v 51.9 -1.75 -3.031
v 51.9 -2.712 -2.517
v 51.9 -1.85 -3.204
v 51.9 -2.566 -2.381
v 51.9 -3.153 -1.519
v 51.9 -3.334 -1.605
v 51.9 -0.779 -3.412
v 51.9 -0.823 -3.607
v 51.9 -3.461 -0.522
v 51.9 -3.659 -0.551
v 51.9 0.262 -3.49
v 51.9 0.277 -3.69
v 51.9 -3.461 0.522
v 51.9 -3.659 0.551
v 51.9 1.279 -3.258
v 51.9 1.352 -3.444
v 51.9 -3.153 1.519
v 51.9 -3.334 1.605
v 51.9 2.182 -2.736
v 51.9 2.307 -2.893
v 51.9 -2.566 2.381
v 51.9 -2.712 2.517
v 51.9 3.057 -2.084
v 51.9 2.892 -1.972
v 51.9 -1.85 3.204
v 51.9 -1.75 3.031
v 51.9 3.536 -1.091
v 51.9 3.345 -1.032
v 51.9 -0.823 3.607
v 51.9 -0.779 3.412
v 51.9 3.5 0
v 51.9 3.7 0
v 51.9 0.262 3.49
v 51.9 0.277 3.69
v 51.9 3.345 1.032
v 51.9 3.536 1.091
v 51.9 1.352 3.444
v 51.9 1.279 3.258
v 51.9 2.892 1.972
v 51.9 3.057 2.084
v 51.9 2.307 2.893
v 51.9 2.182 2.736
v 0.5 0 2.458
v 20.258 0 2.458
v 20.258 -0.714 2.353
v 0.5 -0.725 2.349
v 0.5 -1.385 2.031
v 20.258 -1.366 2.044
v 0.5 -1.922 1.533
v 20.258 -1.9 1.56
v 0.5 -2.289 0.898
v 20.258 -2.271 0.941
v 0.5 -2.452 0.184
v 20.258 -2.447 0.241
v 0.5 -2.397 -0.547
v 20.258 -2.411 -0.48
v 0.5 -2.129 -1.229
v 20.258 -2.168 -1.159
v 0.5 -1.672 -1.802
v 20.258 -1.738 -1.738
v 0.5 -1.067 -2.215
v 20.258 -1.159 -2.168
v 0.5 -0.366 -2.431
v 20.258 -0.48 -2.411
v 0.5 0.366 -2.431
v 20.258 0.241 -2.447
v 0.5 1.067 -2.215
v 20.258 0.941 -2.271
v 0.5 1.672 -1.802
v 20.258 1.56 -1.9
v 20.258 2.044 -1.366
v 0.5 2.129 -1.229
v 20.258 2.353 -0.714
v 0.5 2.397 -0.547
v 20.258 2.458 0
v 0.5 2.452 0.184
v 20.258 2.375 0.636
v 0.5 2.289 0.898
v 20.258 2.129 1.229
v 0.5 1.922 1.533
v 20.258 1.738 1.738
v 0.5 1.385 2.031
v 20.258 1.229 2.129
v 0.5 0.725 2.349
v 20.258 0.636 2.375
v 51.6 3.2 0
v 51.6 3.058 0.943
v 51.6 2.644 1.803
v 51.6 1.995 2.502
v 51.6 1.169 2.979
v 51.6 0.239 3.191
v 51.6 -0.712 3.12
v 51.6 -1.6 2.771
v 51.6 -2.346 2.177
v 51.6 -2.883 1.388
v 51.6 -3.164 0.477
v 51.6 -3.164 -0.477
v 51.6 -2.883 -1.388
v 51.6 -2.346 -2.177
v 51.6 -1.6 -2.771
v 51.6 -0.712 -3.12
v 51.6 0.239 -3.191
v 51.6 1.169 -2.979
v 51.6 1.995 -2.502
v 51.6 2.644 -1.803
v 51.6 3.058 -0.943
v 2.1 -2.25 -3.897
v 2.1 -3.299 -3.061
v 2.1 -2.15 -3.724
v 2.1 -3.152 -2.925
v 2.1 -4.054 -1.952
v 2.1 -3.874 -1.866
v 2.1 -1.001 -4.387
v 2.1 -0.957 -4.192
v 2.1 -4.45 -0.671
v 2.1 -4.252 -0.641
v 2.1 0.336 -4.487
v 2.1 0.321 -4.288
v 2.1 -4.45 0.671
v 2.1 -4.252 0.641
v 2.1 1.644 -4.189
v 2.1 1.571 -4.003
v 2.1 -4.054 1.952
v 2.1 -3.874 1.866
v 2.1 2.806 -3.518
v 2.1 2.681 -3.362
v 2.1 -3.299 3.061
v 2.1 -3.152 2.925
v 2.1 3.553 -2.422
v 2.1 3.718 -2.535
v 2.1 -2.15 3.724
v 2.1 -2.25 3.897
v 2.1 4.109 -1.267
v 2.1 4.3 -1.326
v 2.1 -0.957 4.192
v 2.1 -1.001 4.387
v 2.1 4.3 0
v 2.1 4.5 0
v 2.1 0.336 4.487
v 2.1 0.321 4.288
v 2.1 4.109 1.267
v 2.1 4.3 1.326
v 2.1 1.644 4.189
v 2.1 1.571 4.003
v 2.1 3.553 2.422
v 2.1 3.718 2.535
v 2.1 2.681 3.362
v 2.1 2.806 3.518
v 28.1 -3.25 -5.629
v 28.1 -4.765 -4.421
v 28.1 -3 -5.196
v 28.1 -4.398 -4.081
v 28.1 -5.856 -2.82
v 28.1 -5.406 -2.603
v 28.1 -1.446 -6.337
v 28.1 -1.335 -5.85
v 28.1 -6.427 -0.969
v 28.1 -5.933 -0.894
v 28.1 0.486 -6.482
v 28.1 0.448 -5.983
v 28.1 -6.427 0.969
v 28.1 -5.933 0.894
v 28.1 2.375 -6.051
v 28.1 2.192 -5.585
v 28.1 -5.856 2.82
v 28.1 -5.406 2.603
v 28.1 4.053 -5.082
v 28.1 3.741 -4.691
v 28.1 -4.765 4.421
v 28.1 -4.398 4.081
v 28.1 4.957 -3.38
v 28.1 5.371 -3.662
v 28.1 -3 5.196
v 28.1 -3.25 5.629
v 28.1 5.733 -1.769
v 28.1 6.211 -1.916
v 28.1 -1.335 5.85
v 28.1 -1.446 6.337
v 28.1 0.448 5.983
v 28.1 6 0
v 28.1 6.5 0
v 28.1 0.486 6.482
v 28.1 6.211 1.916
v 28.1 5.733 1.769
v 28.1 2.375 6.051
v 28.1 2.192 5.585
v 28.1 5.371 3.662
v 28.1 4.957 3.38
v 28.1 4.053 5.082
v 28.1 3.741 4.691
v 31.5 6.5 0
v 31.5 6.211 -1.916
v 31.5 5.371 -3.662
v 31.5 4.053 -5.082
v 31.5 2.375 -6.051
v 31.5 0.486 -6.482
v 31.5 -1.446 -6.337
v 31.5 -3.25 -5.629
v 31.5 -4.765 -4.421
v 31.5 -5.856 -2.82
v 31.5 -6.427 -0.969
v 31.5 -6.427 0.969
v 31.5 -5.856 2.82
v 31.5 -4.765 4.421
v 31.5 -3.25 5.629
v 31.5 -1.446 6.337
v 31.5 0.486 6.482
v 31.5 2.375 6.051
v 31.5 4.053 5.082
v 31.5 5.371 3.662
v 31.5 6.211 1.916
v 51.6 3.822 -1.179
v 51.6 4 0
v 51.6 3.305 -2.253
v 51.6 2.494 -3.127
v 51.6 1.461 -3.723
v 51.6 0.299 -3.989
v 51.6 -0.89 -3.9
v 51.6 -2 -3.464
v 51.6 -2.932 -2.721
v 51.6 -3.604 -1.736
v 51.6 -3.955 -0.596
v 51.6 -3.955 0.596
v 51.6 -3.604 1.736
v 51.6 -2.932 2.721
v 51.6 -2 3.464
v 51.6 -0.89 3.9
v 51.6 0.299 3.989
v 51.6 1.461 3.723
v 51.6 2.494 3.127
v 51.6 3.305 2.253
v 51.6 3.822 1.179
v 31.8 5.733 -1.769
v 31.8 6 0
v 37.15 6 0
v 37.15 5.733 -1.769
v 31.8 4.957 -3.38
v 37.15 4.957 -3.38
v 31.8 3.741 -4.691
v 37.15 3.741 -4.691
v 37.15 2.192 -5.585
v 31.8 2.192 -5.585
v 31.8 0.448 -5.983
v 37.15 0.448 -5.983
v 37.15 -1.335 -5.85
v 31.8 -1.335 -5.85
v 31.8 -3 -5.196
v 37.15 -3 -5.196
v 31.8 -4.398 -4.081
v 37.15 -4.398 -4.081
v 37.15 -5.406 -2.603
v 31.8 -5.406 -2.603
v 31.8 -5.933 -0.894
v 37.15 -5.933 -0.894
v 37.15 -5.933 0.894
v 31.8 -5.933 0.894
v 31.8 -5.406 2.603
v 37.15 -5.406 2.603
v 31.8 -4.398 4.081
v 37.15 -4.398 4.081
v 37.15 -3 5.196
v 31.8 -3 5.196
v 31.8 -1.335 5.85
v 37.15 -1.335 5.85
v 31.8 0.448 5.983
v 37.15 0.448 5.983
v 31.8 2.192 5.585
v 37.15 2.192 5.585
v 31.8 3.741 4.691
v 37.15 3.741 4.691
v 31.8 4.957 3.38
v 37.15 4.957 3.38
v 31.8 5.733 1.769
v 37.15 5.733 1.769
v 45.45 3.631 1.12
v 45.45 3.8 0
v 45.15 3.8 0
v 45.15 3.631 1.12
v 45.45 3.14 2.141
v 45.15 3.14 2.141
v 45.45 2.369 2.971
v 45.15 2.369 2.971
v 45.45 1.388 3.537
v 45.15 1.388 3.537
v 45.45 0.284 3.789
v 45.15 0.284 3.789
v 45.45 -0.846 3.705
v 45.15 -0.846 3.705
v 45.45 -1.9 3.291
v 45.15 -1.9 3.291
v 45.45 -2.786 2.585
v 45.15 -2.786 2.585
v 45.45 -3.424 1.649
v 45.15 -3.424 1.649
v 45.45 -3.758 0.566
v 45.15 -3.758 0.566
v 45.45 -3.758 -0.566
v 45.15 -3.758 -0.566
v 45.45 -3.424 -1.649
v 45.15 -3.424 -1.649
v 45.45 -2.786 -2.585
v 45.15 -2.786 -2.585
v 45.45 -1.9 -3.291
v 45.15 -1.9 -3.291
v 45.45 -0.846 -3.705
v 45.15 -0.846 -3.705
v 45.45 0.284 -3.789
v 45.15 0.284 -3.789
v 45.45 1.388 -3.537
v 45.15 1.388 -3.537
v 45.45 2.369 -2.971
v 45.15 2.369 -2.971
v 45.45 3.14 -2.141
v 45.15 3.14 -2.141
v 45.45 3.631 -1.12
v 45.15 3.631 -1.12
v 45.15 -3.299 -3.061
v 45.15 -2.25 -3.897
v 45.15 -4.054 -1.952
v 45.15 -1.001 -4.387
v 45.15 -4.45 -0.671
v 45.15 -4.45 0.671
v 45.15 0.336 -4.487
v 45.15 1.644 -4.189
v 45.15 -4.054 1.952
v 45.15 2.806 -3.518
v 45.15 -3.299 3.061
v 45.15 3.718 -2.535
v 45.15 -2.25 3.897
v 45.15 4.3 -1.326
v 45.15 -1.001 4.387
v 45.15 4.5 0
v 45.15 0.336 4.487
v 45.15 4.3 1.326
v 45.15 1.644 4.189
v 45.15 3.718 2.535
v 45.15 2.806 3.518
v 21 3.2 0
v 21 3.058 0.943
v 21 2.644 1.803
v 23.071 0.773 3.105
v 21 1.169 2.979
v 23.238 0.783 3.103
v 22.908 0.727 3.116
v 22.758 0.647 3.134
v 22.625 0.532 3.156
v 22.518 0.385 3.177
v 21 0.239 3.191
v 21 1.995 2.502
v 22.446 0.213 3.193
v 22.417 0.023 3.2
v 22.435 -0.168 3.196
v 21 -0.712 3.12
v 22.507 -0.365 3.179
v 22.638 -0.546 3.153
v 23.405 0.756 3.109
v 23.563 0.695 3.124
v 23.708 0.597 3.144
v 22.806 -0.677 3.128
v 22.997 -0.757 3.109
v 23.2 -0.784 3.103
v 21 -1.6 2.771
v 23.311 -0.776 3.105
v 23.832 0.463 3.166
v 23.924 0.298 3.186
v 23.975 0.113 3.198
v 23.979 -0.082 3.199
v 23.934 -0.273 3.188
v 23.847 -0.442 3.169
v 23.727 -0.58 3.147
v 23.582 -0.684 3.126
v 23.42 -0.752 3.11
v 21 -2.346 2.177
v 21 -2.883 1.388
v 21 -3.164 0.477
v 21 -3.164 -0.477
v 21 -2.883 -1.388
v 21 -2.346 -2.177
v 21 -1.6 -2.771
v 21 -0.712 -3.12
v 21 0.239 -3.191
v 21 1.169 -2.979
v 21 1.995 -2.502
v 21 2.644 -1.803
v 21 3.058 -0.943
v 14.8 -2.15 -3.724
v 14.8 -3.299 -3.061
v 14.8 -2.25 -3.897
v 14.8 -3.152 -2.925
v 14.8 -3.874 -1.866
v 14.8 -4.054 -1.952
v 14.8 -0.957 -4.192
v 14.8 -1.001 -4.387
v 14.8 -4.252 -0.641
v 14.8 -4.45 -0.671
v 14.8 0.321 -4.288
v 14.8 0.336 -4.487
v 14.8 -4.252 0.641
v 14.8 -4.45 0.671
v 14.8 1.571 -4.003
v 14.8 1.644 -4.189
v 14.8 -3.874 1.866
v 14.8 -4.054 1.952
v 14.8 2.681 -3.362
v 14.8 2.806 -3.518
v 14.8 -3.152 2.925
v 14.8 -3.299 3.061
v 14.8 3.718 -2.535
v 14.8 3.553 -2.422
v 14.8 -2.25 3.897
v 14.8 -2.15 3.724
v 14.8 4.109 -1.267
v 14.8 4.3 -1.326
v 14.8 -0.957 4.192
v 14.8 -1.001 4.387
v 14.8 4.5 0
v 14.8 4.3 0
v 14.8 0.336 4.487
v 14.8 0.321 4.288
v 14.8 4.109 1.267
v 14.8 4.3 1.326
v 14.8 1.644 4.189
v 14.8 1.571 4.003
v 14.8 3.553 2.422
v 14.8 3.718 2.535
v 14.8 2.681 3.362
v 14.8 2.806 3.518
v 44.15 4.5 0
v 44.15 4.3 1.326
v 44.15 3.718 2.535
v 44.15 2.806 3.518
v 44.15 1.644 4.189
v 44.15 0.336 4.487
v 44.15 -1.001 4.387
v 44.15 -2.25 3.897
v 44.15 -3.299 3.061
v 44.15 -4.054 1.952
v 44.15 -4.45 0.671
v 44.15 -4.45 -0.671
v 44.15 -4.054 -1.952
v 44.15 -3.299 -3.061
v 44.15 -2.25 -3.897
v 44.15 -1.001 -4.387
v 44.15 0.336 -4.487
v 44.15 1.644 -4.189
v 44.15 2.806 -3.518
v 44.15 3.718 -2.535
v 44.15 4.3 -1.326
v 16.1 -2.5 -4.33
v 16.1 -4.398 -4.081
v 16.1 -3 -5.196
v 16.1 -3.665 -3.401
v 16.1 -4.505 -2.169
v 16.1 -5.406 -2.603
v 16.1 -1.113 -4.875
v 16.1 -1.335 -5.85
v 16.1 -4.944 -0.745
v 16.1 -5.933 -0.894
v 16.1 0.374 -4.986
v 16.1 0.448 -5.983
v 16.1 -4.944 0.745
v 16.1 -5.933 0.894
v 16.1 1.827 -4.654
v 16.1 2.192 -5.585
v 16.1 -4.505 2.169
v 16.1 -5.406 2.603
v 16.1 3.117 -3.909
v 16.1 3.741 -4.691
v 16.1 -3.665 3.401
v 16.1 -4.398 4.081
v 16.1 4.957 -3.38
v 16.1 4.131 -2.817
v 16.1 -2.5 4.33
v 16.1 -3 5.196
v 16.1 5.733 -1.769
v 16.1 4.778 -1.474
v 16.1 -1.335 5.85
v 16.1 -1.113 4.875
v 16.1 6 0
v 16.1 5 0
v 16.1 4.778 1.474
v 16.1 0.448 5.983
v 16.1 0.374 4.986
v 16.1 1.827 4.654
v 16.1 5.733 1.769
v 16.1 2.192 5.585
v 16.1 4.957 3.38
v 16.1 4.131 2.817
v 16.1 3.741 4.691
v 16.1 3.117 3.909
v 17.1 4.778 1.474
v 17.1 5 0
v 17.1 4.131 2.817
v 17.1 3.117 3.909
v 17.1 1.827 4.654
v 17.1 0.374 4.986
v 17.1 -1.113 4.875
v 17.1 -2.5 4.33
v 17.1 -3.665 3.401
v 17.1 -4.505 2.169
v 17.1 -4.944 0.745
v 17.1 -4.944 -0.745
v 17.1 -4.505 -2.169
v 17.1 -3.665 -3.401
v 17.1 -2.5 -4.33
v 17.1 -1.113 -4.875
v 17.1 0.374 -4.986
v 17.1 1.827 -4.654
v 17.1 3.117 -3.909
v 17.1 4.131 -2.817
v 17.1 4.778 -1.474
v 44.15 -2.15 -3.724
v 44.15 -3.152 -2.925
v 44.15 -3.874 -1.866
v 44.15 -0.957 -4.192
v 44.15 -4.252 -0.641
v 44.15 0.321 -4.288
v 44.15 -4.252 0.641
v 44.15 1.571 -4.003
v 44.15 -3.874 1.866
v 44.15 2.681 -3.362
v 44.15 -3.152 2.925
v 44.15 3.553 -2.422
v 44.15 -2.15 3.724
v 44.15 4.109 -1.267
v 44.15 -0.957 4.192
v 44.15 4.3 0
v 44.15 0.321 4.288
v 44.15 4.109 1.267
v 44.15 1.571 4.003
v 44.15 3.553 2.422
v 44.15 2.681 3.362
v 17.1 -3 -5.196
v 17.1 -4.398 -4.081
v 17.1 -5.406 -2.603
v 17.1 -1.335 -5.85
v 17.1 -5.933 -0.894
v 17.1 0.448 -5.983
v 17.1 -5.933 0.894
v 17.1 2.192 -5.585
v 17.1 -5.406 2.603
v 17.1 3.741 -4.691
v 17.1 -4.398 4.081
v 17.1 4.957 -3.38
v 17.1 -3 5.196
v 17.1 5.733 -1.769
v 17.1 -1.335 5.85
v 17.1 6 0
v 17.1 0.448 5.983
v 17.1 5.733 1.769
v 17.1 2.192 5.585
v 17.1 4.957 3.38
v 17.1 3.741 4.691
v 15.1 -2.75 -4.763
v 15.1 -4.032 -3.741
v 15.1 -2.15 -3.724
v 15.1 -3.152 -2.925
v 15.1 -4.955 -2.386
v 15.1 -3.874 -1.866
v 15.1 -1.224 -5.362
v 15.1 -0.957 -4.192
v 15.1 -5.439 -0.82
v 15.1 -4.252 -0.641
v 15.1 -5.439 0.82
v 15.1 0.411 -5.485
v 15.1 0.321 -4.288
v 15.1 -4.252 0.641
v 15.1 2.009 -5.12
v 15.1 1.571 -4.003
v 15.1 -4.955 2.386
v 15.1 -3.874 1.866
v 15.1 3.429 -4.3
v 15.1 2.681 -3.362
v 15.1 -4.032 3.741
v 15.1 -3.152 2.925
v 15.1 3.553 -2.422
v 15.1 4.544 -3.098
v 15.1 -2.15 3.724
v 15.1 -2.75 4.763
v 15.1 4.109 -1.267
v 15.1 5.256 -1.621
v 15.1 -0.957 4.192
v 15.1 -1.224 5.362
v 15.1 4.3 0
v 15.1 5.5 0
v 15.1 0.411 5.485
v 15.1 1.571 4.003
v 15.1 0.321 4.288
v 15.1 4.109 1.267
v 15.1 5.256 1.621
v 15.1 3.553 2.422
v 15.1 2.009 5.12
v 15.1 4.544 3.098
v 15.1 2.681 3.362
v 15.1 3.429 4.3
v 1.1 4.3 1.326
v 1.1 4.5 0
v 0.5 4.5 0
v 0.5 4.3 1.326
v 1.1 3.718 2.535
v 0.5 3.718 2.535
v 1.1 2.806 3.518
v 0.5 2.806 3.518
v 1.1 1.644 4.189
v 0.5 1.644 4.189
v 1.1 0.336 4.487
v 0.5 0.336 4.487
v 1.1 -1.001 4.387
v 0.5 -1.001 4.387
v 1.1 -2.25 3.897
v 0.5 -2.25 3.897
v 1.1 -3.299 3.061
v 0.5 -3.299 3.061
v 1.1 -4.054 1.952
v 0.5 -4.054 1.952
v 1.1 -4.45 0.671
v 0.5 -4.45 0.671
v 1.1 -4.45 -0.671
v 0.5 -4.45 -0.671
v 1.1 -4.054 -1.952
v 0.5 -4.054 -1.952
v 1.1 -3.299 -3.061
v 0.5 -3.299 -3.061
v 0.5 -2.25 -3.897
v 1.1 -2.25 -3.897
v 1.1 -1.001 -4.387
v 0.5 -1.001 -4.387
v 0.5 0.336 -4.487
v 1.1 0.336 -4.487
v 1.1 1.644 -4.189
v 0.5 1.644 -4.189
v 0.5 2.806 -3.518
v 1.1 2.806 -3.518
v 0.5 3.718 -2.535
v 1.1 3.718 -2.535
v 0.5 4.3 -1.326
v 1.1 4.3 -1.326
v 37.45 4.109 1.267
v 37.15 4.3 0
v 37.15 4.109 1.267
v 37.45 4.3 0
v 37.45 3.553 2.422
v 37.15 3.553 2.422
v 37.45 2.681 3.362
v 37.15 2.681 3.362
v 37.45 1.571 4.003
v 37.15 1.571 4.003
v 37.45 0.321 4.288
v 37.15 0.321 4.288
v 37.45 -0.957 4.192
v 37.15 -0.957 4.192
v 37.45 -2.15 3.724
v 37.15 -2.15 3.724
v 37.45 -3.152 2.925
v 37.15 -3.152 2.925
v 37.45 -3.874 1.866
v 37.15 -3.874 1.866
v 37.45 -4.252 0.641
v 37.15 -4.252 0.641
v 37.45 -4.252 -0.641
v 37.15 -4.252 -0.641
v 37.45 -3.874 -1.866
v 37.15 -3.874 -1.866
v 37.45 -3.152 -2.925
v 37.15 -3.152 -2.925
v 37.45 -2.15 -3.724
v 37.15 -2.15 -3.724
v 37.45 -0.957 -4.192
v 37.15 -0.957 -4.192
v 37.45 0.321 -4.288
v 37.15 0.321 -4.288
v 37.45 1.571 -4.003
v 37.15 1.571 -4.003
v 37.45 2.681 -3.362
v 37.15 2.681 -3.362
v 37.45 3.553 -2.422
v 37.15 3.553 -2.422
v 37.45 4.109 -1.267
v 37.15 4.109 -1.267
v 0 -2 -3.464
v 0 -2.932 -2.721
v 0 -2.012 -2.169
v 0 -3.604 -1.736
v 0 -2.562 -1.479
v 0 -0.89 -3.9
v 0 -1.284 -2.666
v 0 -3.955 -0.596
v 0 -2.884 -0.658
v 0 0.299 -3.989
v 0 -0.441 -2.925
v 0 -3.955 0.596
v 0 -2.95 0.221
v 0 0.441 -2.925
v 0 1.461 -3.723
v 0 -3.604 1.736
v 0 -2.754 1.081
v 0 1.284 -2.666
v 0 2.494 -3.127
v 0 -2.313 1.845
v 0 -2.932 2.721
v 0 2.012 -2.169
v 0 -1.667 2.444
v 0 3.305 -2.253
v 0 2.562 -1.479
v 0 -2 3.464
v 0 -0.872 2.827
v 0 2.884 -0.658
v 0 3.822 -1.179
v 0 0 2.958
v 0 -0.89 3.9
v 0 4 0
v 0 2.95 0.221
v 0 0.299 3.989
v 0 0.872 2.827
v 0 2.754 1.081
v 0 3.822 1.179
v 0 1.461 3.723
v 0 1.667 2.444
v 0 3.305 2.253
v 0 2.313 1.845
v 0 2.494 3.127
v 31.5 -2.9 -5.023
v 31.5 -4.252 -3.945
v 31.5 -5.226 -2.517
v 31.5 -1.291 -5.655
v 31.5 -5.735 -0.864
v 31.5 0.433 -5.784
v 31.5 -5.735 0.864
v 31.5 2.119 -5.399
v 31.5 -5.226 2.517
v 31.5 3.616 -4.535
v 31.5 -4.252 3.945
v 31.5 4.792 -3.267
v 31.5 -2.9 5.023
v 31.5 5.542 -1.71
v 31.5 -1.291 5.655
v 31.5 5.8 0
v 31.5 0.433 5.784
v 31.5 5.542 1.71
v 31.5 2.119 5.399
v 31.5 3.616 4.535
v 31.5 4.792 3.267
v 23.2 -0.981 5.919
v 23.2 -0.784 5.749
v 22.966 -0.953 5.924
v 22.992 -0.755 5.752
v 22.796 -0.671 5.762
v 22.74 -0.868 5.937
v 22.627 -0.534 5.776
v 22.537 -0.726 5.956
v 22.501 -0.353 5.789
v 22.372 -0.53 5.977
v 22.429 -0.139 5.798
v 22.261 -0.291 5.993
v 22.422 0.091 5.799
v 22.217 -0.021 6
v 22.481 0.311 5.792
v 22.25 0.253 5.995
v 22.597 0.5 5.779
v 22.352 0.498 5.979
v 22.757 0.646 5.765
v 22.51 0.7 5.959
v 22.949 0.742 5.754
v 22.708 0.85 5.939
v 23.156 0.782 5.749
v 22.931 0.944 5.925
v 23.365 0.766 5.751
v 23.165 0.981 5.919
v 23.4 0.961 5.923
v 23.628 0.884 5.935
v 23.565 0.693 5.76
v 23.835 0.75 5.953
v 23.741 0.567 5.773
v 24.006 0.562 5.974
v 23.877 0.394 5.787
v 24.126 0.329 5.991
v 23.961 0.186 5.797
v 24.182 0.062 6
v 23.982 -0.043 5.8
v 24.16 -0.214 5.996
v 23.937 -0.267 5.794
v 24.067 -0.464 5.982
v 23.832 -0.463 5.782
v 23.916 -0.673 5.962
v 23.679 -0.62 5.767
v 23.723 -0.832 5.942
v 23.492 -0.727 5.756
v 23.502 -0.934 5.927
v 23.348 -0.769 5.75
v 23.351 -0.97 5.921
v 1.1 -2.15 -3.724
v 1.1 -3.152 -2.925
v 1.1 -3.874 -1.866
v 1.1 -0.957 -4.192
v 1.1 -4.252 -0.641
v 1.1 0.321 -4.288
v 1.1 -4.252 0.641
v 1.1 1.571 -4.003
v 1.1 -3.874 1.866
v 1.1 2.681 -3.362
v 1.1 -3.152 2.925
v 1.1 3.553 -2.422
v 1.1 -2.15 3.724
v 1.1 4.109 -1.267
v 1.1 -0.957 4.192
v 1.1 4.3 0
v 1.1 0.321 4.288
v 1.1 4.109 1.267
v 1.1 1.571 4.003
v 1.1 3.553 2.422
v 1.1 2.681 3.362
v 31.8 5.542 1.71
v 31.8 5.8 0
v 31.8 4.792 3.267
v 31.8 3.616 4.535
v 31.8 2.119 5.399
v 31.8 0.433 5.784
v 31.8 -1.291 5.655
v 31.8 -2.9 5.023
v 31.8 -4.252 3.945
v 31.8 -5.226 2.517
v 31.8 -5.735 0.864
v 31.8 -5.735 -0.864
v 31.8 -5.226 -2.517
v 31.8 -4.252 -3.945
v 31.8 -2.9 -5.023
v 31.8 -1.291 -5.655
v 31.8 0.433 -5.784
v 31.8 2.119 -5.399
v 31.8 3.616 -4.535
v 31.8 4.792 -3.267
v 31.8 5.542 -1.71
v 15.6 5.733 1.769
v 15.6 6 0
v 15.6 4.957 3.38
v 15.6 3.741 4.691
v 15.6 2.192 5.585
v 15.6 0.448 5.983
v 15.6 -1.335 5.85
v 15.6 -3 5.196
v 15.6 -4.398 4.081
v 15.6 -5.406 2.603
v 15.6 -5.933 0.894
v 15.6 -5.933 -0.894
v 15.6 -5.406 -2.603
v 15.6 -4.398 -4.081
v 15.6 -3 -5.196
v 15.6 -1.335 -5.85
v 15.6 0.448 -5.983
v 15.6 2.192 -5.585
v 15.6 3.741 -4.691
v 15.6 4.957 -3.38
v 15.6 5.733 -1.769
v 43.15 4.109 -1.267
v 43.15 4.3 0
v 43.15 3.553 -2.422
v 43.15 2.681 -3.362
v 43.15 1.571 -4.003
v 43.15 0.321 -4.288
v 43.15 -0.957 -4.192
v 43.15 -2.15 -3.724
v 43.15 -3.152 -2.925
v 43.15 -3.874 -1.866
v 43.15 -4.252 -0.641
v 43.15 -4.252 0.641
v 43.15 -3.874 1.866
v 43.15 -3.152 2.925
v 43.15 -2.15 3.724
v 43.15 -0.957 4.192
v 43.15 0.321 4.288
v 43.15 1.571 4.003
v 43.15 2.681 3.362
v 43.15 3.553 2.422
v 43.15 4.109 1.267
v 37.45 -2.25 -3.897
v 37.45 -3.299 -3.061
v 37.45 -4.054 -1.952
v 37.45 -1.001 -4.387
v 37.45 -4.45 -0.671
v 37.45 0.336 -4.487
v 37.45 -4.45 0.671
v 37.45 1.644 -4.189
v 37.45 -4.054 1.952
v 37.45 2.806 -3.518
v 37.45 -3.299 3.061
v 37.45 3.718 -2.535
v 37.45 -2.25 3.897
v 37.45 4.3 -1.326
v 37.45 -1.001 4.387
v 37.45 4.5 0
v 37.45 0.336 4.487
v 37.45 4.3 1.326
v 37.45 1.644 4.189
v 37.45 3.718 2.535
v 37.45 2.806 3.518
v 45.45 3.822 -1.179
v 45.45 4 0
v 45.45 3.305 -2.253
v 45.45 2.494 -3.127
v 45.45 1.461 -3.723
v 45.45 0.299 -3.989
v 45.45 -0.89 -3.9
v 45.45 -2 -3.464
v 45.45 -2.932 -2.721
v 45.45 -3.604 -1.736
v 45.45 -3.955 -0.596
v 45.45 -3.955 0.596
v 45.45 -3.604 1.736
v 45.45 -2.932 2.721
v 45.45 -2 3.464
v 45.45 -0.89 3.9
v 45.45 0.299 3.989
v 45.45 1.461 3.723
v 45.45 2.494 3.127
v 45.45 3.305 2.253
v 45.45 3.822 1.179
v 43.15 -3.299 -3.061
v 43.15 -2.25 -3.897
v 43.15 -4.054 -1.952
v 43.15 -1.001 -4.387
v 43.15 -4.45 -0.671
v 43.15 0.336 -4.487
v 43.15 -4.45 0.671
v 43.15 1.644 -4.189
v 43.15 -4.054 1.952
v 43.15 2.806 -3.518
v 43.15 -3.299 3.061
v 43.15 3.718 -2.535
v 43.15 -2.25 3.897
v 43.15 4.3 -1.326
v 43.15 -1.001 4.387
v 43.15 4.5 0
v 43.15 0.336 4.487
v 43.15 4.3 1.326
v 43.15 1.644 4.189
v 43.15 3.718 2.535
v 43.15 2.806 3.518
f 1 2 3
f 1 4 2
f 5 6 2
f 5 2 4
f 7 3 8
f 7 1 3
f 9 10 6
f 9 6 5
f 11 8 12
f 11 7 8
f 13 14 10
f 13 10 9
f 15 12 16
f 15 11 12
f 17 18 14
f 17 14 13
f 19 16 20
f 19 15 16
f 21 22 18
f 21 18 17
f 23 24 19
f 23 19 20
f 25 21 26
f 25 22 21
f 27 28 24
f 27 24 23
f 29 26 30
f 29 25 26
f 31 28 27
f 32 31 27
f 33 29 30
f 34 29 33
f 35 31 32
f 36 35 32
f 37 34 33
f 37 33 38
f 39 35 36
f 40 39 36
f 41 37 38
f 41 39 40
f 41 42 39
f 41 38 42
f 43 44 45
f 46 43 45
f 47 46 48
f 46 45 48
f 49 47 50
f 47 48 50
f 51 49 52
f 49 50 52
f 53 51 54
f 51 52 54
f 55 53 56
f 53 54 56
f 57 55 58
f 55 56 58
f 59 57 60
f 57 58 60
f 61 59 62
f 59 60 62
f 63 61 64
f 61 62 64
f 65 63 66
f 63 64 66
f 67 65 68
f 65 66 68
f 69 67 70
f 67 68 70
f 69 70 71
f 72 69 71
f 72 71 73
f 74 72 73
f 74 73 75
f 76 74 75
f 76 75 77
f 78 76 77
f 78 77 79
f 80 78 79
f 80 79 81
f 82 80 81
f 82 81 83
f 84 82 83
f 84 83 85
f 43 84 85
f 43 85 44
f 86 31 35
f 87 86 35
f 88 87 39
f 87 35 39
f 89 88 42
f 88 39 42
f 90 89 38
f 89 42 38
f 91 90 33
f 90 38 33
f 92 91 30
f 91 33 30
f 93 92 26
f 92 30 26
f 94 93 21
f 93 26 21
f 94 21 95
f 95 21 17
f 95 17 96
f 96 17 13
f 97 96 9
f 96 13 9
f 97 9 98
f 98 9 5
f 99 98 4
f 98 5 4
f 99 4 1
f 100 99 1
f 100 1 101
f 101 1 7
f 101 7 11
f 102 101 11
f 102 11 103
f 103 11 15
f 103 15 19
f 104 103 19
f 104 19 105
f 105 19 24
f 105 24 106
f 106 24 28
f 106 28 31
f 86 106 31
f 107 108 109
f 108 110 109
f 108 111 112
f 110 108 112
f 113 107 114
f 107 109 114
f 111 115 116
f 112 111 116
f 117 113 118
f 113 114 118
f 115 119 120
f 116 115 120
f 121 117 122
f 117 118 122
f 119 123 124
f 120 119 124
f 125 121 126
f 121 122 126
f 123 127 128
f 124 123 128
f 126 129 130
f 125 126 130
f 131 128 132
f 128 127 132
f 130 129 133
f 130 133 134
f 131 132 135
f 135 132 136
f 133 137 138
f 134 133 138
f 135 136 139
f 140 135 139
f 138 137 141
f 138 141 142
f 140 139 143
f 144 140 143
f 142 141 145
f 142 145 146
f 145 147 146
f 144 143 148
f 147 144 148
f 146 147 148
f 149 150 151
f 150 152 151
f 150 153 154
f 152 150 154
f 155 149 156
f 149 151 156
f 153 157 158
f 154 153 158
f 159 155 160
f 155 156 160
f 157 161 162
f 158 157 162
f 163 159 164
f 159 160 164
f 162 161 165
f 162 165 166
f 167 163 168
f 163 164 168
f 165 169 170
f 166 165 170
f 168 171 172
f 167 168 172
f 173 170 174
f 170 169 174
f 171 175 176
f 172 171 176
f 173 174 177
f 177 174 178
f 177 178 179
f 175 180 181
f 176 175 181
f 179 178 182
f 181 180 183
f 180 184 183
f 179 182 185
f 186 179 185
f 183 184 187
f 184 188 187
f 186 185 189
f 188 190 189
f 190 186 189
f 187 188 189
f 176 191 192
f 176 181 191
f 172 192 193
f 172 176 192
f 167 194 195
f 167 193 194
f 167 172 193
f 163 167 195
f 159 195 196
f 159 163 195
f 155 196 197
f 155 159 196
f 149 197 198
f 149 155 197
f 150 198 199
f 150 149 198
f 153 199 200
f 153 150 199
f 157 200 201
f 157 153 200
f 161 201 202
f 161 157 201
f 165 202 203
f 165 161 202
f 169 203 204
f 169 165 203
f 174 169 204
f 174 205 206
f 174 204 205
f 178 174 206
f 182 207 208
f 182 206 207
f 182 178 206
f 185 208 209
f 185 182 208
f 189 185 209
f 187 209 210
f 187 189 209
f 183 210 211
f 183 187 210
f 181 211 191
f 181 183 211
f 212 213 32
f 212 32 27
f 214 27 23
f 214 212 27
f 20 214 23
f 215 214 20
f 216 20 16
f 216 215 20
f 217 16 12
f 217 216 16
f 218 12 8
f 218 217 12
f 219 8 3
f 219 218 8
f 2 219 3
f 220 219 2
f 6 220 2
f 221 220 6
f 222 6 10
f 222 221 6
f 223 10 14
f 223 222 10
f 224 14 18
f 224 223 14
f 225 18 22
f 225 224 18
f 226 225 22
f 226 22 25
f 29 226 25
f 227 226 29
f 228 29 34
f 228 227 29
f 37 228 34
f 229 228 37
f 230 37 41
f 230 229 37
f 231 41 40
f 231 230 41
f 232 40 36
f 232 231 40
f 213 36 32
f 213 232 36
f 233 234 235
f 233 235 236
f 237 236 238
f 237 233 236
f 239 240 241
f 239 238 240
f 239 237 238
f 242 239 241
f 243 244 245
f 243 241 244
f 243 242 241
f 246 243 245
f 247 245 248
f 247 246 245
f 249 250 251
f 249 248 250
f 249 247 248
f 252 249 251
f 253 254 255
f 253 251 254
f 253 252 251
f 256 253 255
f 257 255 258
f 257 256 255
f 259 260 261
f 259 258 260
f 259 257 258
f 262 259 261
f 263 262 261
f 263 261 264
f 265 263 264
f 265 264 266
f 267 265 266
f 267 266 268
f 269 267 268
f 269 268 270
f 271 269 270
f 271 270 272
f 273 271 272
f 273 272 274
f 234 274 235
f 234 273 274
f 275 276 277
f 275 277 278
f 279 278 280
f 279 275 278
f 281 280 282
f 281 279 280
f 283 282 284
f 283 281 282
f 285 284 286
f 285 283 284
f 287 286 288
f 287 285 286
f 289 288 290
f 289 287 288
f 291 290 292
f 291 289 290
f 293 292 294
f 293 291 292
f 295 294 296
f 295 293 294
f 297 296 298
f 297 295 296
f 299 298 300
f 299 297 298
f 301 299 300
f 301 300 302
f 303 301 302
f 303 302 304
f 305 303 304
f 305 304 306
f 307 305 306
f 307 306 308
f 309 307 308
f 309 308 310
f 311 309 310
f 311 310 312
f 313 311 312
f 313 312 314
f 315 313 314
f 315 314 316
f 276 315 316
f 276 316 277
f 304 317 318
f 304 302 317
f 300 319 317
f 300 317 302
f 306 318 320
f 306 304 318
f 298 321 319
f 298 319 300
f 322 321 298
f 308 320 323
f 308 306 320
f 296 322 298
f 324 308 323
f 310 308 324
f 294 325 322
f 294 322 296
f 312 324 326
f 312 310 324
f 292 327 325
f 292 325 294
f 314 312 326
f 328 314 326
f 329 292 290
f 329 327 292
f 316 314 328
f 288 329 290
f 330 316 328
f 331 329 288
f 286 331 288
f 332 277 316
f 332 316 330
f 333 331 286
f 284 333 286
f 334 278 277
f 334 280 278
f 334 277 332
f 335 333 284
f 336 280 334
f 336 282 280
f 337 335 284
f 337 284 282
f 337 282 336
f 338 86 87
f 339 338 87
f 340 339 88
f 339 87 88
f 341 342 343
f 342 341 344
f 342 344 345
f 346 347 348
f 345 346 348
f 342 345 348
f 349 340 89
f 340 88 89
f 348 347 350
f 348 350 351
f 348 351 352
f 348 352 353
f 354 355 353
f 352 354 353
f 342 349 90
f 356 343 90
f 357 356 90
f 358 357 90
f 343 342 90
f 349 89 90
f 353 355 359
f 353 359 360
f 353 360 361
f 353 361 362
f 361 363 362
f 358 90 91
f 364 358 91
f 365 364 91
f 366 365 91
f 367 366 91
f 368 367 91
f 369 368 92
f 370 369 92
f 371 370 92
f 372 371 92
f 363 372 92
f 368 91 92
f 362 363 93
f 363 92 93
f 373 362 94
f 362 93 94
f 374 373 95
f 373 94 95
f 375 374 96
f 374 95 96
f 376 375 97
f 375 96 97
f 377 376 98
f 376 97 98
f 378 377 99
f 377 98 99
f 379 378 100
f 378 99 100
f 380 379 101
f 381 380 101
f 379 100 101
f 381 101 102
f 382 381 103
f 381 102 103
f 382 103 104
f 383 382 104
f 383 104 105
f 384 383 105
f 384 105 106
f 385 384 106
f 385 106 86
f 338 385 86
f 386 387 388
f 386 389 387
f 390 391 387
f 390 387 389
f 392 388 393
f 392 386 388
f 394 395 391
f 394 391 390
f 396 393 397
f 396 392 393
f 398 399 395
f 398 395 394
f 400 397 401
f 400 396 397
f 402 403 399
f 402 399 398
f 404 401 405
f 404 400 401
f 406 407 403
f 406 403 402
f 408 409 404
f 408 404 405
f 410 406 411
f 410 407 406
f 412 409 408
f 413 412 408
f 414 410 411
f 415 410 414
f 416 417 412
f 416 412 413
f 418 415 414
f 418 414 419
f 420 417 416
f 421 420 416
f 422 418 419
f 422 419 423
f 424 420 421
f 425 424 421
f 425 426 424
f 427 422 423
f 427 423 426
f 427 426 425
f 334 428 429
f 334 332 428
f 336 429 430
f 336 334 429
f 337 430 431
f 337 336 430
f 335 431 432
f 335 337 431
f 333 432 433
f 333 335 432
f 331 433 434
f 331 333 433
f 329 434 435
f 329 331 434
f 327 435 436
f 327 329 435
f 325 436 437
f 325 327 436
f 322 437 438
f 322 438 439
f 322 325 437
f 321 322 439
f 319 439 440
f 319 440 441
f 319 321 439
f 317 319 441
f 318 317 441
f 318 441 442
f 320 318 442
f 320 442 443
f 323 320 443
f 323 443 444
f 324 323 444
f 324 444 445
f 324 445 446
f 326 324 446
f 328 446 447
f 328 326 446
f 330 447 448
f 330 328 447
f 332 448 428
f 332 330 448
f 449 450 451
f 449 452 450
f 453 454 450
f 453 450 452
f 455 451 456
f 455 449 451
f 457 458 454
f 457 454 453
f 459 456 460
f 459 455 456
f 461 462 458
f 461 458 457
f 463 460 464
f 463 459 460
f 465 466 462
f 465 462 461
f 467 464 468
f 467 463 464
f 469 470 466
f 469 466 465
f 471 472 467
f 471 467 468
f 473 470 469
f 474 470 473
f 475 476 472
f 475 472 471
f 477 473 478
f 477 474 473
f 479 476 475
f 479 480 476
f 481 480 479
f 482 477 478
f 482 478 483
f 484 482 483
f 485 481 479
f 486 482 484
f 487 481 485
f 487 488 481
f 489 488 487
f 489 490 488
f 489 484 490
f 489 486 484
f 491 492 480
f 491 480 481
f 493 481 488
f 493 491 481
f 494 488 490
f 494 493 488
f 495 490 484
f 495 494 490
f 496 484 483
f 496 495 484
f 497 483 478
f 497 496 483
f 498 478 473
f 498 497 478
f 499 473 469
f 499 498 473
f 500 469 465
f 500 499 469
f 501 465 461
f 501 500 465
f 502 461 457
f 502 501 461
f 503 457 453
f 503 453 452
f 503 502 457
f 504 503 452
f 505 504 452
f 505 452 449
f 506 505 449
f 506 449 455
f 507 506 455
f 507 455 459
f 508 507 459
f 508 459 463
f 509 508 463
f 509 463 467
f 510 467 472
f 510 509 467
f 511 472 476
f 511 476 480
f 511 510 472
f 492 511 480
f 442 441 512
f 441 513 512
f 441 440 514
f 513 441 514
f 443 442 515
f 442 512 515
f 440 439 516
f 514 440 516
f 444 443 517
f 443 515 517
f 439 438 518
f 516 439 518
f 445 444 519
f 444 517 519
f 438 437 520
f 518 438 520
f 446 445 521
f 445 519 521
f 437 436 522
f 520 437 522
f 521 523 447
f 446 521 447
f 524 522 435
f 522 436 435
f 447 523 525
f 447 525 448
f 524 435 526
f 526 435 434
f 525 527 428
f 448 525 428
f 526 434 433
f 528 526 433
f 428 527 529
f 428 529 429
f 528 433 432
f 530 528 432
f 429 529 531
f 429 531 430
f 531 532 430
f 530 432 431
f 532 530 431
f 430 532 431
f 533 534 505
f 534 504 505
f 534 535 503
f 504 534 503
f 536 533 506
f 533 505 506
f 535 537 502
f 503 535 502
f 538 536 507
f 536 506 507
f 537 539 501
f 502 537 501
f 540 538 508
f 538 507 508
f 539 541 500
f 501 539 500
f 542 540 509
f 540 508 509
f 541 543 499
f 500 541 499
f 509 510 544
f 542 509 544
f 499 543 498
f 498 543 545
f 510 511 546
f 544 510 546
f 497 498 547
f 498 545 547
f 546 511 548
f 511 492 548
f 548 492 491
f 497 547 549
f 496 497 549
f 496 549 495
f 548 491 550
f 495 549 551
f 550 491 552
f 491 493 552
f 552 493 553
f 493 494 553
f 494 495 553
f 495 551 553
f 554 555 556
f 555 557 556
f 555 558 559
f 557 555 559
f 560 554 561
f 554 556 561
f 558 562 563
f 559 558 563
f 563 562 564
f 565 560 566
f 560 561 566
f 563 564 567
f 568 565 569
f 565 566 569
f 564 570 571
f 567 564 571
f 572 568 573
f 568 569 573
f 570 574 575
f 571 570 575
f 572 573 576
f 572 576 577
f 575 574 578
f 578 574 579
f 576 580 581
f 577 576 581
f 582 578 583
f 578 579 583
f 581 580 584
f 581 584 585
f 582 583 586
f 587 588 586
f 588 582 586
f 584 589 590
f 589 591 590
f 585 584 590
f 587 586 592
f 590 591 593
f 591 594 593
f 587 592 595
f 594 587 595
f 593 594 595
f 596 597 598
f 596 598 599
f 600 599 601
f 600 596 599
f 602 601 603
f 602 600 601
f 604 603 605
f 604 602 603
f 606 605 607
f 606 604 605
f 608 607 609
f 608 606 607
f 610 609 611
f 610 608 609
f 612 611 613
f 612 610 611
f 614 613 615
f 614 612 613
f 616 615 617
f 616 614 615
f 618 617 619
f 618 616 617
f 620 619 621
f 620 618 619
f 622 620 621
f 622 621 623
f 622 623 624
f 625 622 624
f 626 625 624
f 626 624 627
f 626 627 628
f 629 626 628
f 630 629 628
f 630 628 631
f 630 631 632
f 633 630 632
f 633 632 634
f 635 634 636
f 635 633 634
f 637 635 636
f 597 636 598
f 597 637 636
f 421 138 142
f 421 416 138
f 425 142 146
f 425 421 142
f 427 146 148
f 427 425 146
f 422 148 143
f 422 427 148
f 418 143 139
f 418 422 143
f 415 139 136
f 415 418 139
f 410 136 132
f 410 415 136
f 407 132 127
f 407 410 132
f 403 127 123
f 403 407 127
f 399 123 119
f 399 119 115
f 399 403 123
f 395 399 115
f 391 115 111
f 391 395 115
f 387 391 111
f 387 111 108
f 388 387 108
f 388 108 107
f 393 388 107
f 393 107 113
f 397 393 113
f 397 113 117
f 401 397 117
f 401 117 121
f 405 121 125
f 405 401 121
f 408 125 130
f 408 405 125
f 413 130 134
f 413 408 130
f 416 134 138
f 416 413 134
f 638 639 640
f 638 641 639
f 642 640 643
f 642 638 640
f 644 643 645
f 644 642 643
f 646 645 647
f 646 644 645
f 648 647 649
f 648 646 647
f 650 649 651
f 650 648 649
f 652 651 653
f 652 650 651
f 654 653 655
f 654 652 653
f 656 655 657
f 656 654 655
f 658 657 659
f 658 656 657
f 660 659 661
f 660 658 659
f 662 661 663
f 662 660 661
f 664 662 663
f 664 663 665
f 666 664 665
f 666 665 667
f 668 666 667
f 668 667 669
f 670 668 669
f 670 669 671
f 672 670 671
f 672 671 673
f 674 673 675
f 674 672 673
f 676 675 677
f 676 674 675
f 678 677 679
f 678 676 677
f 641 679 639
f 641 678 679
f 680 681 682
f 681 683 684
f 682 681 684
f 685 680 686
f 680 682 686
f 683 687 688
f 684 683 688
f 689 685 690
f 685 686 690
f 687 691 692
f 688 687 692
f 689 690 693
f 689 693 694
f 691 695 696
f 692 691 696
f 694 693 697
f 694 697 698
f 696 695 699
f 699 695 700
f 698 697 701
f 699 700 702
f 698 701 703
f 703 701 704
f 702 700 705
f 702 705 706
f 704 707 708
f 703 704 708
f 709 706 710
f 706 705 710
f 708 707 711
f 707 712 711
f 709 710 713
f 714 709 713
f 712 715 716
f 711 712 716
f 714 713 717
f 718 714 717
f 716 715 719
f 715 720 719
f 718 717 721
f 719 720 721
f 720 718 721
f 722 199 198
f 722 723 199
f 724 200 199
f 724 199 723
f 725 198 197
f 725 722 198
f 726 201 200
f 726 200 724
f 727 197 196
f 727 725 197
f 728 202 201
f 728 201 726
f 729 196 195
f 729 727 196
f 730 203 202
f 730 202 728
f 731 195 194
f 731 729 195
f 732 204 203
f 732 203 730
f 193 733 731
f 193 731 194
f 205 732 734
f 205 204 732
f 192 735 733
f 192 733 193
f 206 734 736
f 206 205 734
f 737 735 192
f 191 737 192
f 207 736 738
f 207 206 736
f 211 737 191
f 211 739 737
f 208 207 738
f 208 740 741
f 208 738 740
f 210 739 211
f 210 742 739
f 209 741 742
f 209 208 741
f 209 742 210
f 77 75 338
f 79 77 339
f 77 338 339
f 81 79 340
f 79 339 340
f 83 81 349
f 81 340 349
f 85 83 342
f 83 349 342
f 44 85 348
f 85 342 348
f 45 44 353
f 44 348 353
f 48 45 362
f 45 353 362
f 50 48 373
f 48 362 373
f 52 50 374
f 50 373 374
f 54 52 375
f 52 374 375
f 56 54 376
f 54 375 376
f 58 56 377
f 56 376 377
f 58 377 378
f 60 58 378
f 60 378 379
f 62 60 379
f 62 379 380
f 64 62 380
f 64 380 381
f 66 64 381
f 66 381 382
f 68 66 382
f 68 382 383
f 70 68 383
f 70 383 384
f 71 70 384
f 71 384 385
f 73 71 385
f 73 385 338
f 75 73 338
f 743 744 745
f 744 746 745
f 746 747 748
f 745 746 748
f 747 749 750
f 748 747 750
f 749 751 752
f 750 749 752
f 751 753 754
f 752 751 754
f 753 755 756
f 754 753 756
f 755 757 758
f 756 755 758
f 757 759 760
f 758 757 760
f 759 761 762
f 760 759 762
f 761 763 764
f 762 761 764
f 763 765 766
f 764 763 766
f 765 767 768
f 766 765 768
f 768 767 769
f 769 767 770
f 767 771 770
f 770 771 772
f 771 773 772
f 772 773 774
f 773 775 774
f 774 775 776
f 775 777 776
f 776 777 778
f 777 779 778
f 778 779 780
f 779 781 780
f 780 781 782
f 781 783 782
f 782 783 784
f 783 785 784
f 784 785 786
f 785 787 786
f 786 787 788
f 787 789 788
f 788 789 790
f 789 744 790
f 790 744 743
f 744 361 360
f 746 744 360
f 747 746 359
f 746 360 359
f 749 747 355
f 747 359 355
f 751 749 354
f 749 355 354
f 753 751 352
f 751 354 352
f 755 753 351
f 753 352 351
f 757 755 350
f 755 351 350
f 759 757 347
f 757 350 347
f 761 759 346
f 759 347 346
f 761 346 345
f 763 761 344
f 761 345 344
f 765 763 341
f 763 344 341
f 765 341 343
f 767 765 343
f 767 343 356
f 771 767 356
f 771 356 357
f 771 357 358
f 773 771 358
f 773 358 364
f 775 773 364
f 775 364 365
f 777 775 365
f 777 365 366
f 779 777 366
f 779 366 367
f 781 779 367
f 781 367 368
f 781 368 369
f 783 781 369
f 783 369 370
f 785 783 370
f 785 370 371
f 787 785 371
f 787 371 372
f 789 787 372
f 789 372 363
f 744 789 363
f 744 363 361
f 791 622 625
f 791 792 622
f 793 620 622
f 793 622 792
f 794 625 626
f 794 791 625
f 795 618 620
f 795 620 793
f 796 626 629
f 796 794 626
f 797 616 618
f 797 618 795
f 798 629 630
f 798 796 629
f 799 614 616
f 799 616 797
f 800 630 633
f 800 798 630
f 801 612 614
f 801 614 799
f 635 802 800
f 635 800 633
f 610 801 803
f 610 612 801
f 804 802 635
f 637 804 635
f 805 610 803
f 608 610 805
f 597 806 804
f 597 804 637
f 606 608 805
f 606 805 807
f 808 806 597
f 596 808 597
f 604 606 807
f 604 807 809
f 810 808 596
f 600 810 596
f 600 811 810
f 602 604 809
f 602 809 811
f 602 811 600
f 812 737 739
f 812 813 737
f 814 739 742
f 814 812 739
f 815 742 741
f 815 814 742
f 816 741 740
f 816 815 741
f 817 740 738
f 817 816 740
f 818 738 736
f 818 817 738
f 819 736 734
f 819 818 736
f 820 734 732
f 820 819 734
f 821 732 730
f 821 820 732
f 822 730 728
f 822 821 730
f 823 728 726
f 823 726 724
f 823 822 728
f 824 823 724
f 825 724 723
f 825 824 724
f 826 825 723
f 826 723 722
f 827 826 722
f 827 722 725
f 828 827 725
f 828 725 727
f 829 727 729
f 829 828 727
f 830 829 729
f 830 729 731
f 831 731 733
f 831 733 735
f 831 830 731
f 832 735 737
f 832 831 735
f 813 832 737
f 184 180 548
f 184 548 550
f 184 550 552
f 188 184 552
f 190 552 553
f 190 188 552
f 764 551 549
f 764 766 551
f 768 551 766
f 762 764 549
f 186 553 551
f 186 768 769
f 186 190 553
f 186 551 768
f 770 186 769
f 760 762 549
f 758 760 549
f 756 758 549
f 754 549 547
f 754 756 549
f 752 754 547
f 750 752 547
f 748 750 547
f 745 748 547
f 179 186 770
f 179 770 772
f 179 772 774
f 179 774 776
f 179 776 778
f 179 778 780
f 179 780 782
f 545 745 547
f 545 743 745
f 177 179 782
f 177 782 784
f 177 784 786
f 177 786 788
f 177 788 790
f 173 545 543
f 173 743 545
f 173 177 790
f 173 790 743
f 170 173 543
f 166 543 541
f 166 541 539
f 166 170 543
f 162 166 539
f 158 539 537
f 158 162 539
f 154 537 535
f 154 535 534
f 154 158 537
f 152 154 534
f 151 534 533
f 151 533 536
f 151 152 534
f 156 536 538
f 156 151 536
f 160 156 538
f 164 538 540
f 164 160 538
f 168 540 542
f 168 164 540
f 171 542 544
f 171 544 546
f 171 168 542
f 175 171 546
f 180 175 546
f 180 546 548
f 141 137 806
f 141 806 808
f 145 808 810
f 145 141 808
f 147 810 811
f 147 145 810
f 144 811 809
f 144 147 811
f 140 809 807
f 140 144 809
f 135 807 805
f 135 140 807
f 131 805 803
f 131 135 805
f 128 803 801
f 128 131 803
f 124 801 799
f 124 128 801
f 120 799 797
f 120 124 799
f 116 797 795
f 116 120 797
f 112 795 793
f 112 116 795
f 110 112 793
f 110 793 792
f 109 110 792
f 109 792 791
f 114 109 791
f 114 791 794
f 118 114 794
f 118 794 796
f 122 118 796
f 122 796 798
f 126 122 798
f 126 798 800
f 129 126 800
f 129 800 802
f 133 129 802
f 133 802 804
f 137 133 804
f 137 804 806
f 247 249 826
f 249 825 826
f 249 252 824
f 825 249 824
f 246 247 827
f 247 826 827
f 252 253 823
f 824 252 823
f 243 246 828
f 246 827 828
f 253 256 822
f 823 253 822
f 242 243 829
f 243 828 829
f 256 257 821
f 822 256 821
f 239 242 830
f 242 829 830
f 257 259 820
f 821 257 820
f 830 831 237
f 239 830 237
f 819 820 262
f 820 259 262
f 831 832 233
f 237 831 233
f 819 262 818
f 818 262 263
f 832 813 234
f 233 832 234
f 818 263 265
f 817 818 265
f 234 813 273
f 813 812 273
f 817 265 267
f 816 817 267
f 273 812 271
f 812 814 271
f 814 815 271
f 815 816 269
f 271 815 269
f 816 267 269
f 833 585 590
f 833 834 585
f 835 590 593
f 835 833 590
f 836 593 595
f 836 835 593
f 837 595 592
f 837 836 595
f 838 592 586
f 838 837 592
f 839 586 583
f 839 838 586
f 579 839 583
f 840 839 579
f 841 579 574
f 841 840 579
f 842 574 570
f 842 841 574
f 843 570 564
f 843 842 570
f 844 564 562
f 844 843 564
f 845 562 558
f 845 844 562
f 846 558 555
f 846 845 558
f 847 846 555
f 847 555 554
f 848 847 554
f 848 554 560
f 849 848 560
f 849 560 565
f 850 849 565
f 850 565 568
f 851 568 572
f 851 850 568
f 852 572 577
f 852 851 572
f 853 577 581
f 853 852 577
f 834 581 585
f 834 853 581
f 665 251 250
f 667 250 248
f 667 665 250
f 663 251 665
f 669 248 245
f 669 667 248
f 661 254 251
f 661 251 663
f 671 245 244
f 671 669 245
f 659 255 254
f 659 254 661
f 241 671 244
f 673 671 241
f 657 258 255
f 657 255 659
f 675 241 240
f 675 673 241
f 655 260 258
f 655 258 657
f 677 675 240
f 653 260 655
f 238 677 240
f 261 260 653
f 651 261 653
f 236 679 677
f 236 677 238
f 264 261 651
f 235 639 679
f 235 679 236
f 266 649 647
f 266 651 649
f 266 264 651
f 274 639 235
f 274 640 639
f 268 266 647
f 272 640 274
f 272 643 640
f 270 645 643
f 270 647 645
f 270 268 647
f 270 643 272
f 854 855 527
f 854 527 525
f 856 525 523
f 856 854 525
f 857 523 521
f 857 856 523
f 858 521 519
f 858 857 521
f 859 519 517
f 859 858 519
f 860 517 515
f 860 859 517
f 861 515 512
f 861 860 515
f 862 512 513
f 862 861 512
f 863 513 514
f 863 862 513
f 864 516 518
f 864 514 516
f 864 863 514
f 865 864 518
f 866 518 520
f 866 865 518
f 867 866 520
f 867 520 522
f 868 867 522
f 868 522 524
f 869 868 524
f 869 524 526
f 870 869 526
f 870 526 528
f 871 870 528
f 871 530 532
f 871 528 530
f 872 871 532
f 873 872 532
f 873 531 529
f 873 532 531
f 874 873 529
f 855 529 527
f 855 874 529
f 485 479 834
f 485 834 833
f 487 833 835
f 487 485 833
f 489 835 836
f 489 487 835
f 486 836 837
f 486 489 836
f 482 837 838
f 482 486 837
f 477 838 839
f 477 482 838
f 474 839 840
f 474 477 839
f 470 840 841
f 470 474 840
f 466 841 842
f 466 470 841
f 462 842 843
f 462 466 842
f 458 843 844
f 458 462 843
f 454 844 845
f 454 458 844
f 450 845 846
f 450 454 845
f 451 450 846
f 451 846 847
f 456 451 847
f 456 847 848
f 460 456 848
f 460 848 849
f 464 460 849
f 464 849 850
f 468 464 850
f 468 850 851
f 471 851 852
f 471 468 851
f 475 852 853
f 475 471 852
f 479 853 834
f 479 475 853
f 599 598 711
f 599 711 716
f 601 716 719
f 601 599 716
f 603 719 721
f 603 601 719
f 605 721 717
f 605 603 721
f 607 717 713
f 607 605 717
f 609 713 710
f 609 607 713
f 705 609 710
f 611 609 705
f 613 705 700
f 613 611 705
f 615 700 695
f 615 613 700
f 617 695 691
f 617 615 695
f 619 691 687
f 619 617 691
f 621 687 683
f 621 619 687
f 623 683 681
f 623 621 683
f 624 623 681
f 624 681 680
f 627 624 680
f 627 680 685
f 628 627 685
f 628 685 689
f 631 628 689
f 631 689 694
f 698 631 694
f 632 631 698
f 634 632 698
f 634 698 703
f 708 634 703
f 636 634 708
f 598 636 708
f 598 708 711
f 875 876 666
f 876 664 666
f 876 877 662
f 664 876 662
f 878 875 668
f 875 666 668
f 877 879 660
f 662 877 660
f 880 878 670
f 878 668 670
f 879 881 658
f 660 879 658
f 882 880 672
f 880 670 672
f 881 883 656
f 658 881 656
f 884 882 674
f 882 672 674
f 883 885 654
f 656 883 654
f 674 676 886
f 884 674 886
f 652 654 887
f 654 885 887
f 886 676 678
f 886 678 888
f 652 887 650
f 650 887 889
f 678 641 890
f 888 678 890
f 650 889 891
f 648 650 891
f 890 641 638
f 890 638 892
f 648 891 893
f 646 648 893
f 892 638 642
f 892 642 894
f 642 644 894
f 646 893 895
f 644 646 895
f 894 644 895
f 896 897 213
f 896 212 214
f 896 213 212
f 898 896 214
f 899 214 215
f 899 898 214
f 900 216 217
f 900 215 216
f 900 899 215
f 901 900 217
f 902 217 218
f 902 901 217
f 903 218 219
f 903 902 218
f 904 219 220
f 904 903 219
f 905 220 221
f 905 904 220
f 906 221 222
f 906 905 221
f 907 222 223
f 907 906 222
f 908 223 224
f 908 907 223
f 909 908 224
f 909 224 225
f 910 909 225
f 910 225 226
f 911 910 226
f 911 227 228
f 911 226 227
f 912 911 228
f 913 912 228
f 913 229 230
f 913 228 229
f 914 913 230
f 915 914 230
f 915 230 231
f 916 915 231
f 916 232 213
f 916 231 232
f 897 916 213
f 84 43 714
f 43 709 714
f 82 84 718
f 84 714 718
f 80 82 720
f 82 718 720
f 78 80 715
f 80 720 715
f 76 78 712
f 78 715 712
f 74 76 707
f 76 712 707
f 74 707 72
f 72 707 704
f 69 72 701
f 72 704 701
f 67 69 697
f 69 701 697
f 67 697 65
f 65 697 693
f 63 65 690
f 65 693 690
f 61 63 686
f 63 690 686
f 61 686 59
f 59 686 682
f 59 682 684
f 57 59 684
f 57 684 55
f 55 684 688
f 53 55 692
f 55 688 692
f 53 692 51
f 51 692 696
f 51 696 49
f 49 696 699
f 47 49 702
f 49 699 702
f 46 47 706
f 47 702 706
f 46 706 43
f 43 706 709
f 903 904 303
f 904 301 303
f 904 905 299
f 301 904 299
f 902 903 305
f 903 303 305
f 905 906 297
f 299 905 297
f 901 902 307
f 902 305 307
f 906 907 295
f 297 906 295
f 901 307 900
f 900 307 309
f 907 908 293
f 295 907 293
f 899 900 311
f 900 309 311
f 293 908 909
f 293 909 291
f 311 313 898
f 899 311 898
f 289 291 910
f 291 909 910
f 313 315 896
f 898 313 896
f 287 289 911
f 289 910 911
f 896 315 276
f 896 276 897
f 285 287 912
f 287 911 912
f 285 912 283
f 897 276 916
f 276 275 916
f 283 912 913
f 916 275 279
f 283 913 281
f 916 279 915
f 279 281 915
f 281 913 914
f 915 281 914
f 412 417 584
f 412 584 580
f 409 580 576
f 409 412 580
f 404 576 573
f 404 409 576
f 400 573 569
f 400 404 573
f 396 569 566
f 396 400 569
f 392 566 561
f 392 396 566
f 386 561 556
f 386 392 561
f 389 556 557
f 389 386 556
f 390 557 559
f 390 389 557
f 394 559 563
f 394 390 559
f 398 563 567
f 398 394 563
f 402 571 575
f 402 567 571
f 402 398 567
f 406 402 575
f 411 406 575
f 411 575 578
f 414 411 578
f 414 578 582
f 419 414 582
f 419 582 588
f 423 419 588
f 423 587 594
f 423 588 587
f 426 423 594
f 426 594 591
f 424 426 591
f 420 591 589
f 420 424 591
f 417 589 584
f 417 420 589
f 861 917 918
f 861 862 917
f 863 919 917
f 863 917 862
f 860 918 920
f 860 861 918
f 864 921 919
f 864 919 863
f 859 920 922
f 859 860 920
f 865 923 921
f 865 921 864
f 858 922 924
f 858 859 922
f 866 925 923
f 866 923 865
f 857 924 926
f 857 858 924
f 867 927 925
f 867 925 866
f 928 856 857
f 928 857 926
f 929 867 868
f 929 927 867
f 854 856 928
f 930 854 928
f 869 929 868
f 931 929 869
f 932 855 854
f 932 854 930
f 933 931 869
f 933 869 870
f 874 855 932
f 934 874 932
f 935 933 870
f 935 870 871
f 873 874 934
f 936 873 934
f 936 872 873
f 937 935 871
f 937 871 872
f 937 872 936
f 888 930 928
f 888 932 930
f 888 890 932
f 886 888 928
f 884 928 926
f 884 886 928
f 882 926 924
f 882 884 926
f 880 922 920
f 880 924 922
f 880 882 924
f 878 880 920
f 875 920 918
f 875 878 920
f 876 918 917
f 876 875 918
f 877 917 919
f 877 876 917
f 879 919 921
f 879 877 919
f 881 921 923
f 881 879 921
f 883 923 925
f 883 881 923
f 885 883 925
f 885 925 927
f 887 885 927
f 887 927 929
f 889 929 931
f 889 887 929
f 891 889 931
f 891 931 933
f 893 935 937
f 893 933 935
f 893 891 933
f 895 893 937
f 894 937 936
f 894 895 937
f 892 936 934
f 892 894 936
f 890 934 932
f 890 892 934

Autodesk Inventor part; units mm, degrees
ref_plane "YZ Plane" through (0, 0, 0) normal (1, 0, 0) x (0, 1, 0)
ref_plane "XZ Plane" through (0, 0, 0) normal (0, 1, 0) x (-1, 0, 0)
ref_plane "XY Plane" through (0, 0, 0) normal (0, 0, 1) x (1, 0, 0)
sketch "Sketch2" plane through (0, 0, 0) normal (0, 0, 1) x (1, 0, 0)
  line L0 (0, 4) -> (0.5, 4.5)
  line L1 (0, 4) -> (0, 3)
  line L2 (0.5, 4.5) -> (1.1, 4.5)
  line L3 (1.1, 4.5) -> (1.1, 4.3)
  line L4 (1.1, 4.3) -> (2.1, 4.3)
  line L5 (2.1, 4.3) -> (2.1, 4.5)
  line L6 (2.1, 4.5) -> (14.8, 4.5)
  line L7 (15.1, 4.5) -> (15.1, 5.5)
  line L8 (15.1, 5.5) -> (15.6, 6)
  line L9 (44.15, 4.5) -> (44.15, 4.3)
  line L10 (44.15, 4.3) -> (43.15, 4.3)
  line L11 (43.15, 4.3) -> (43.15, 4.5)
  line L12 (0, 0) -> (27.0854, 0) construction
  line L13 (15.6, 6) -> (16.1, 6)
  line L14 (16.1, 6) -> (16.1, 5)
  line L15 (16.1, 5) -> (17.1, 5)
  line L16 (17.1, 5) -> (17.1, 6)
  line L17 (31.9, 6) -> (31.8, 6)
  line L18 (31.5, 6) -> (31.5, 6.5)
  line L19 (31.5, 6.5) -> (28.1, 6.5)
  line L20 (28.1, 6.5) -> (28.1, 6)
  line L21 (17.1, 6) -> (28.1, 6)
  line L22 (21, 3.2) -> (43.9, 3.2)
  line L23 (44.15, 4.5) -> (45.15, 4.5)
  line L24 (43.15, 4.5) -> (37.9, 4.5)
  line L25 (37.15, 6) -> (31.9, 6)
  line L26 (43.9, 3.2) -> (49.9, 3.2)
  line L27 (49.9, 4) -> (45.45, 4)
  line L28 (45.15, 4) -> (45.15, 4.5)
  line L29 (49.9, 3.2) -> (51.9, 3.2)
  line L30 (51.9, 3.2) -> (51.9, 4)
  line L31 (51.9, 4) -> (49.9, 4)
  line L32 (37.9, 4.5) -> (37.45, 4.5)
  line L33 (37.15, 4.5) -> (37.15, 6)
  line L34 (15.1, 4.5) -> (15.1, 4.3)
  line L35 (15.1, 4.3) -> (14.8, 4.3)
  line L36 (14.8, 4.3) -> (14.8, 4.5)
  line L37 (31.5, 6) -> (31.5, 5.8)
  line L38 (31.5, 5.8) -> (31.8, 5.8)
  line L39 (31.8, 5.8) -> (31.8, 6)
  line L40 (37.15, 4.5) -> (37.15, 4.3)
  line L41 (37.15, 4.3) -> (37.45, 4.3)
  line L42 (37.45, 4.3) -> (37.45, 4.5)
  line L43 (45.15, 4) -> (45.15, 3.8)
  line L44 (45.15, 3.8) -> (45.45, 3.8)
  line L45 (45.45, 3.8) -> (45.45, 4)
  line L46 (0, 3) -> (0, 0)
  line L47 (0, 0) -> (20, 0)
  line L48 (20, 2.2) -> (20, 0)
  line L49 (20, 2.2) -> (21, 3.2)
  point P0 (1.1, 4.4)
  point P1 (15.85, 6)
  point P2 (16.6, 5)
  dimension "d3" = 4
  dimension "d8" = 1
  dimension "d9" = 0.5
  dimension "d10" = 0.5
  dimension "d11" = 0.2
  dimension "d12" = 1
  dimension "d13" = 13
  dimension "d14" = 1
  dimension "d29" = 0.5
  dimension "d30" = 0.5
  dimension "d36" = 1.1
  dimension "d37" = 4.5
  dimension "d38" = 3
  dimension "d39" = 0.5
  dimension "d40" = 1
  dimension "d41" = 1
  dimension "d60" = 0.4
  dimension "d61" = 0.5
  dimension "d62" = 3.4
  dimension "d63" = 11
  dimension "d65" = 1
  dimension "d66" = 5.25
  dimension "d83" = 6
  dimension "d84" = 0.8
  dimension "d85" = 2
  dimension "d86" = 0.75
  dimension "d105" = 0.2
  dimension "d106" = 0.3
  dimension "d107" = 0.2
  dimension "d108" = 0.3
  dimension "d109" = 0.2
  dimension "d110" = 0.3
  dimension "d111" = 0.2
  dimension "d112" = 0.3
revolve "Revolution1" add sketch "Sketch2" angle 360 about axis through (0, 0, 0) along (1, 0, 0)
thread "Thread1" size "M6x1" class "6H" standard "ISO Metric profile" full length
ref_plane "Work Plane1" through (51.1424, -20, -139.2633) normal (0, 1, 0) x (-1, 0, 0)
sketch "Sketch4" plane through (17.1, 0, 0) normal (-1, 0, 0) x (0, 0, 1)
  circle A0 centre (0, 0) radius 6 projected
  point P0 (0, 6)
  point P1 (6, 0)
  point P2 (0, -6.0107)
  point P3 (-6.0435, 0)
chamfer "Chamfer3" distance 0.3 angle 45 1 edges at (51.9, -4, 0)
ref_plane "Work Plane4" through (17.1, 0, 6) normal (0, 0, 1) x (1, 0, 0)
sketch "Sketch8" plane through (17.1, 0, 6) normal (0, 0, 1) x (1, 0, 0)
  circle A0 centre (6.1, 0) radius 1
  line L0 (0, -6) -> (0, 6) projected
  point P0 (-17.1, 0)
  dimension "d90" = 2
  dimension "d91" = 6.1
hole "Hole3" at (23.2, 0, 6) direction (0, 0, -1) diameter 1.567 depth 6.3 tip angle 118 thread size "M2x0.4" class "6H" standard "ISO Metric profile"
chamfer "Chamfer4" distance 0.2 angle 45 3 edges at (22.6668, -0.5741, 5.9725) (23.7332, -0.5741, 5.9725) (23.2, 0.7835, 5.9486)
chamfer "Chamfer5" distance 0.3 angle 45 1 edges at (51.9, -3.2, 0)
sketch "Sketch9" plane through (0, 0, 0) normal (-1, 0, 0) x (0, 0, 1)
  circle A0 centre (0, 0) radius 1.2953
hole "Hole4" at (0, 0, 0) direction (1, 0, 0) diameter 4.917 end through all thread size "M6x1" class "6H" standard "ISO Metric profile"
chamfer "Chamfer6" distance 0.5 angle 45 1 edges at (0, 0, -2.4585)
properties part number "nakrętka otwor w pionie"
